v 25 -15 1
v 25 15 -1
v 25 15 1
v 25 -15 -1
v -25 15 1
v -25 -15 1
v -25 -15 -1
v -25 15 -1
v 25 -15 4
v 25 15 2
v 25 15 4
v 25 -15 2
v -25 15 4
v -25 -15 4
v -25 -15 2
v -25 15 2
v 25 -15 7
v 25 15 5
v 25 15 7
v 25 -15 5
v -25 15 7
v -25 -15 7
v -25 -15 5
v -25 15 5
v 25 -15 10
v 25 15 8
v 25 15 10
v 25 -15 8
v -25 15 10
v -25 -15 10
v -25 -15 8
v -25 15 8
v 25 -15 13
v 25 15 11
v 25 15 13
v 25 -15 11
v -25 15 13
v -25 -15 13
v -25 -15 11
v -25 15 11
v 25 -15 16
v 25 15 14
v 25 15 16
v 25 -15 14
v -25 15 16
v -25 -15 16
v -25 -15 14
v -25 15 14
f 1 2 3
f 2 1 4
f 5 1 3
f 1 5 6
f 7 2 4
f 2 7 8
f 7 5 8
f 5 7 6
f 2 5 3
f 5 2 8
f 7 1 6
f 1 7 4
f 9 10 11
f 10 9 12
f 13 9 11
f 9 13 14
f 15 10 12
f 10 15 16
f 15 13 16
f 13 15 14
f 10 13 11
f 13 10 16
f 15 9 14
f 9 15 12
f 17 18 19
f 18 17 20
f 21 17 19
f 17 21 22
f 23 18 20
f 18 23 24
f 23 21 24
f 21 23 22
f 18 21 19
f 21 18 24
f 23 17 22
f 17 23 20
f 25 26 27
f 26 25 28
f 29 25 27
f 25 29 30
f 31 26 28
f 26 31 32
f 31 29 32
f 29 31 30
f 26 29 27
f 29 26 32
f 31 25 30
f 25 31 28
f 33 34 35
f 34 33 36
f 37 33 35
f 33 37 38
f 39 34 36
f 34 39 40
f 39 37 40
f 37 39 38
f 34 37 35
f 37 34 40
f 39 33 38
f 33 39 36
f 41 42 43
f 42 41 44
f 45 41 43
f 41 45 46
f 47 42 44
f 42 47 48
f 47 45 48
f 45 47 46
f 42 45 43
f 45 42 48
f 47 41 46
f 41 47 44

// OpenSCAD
// Plate dimensions
plate_length = 50;  // Adjust as needed
plate_width = 30;   // Adjust as needed
plate_thickness = 2; // Adjust as needed

// Module to create a single plate
module plate() {
    cube([plate_length, plate_width, plate_thickness], center=true);
}

// Generate the required number of plates
for (i = [0:5]) {
    translate([0, 0, i * (plate_thickness + 1)]) // Adjust spacing if needed
    plate();
}
